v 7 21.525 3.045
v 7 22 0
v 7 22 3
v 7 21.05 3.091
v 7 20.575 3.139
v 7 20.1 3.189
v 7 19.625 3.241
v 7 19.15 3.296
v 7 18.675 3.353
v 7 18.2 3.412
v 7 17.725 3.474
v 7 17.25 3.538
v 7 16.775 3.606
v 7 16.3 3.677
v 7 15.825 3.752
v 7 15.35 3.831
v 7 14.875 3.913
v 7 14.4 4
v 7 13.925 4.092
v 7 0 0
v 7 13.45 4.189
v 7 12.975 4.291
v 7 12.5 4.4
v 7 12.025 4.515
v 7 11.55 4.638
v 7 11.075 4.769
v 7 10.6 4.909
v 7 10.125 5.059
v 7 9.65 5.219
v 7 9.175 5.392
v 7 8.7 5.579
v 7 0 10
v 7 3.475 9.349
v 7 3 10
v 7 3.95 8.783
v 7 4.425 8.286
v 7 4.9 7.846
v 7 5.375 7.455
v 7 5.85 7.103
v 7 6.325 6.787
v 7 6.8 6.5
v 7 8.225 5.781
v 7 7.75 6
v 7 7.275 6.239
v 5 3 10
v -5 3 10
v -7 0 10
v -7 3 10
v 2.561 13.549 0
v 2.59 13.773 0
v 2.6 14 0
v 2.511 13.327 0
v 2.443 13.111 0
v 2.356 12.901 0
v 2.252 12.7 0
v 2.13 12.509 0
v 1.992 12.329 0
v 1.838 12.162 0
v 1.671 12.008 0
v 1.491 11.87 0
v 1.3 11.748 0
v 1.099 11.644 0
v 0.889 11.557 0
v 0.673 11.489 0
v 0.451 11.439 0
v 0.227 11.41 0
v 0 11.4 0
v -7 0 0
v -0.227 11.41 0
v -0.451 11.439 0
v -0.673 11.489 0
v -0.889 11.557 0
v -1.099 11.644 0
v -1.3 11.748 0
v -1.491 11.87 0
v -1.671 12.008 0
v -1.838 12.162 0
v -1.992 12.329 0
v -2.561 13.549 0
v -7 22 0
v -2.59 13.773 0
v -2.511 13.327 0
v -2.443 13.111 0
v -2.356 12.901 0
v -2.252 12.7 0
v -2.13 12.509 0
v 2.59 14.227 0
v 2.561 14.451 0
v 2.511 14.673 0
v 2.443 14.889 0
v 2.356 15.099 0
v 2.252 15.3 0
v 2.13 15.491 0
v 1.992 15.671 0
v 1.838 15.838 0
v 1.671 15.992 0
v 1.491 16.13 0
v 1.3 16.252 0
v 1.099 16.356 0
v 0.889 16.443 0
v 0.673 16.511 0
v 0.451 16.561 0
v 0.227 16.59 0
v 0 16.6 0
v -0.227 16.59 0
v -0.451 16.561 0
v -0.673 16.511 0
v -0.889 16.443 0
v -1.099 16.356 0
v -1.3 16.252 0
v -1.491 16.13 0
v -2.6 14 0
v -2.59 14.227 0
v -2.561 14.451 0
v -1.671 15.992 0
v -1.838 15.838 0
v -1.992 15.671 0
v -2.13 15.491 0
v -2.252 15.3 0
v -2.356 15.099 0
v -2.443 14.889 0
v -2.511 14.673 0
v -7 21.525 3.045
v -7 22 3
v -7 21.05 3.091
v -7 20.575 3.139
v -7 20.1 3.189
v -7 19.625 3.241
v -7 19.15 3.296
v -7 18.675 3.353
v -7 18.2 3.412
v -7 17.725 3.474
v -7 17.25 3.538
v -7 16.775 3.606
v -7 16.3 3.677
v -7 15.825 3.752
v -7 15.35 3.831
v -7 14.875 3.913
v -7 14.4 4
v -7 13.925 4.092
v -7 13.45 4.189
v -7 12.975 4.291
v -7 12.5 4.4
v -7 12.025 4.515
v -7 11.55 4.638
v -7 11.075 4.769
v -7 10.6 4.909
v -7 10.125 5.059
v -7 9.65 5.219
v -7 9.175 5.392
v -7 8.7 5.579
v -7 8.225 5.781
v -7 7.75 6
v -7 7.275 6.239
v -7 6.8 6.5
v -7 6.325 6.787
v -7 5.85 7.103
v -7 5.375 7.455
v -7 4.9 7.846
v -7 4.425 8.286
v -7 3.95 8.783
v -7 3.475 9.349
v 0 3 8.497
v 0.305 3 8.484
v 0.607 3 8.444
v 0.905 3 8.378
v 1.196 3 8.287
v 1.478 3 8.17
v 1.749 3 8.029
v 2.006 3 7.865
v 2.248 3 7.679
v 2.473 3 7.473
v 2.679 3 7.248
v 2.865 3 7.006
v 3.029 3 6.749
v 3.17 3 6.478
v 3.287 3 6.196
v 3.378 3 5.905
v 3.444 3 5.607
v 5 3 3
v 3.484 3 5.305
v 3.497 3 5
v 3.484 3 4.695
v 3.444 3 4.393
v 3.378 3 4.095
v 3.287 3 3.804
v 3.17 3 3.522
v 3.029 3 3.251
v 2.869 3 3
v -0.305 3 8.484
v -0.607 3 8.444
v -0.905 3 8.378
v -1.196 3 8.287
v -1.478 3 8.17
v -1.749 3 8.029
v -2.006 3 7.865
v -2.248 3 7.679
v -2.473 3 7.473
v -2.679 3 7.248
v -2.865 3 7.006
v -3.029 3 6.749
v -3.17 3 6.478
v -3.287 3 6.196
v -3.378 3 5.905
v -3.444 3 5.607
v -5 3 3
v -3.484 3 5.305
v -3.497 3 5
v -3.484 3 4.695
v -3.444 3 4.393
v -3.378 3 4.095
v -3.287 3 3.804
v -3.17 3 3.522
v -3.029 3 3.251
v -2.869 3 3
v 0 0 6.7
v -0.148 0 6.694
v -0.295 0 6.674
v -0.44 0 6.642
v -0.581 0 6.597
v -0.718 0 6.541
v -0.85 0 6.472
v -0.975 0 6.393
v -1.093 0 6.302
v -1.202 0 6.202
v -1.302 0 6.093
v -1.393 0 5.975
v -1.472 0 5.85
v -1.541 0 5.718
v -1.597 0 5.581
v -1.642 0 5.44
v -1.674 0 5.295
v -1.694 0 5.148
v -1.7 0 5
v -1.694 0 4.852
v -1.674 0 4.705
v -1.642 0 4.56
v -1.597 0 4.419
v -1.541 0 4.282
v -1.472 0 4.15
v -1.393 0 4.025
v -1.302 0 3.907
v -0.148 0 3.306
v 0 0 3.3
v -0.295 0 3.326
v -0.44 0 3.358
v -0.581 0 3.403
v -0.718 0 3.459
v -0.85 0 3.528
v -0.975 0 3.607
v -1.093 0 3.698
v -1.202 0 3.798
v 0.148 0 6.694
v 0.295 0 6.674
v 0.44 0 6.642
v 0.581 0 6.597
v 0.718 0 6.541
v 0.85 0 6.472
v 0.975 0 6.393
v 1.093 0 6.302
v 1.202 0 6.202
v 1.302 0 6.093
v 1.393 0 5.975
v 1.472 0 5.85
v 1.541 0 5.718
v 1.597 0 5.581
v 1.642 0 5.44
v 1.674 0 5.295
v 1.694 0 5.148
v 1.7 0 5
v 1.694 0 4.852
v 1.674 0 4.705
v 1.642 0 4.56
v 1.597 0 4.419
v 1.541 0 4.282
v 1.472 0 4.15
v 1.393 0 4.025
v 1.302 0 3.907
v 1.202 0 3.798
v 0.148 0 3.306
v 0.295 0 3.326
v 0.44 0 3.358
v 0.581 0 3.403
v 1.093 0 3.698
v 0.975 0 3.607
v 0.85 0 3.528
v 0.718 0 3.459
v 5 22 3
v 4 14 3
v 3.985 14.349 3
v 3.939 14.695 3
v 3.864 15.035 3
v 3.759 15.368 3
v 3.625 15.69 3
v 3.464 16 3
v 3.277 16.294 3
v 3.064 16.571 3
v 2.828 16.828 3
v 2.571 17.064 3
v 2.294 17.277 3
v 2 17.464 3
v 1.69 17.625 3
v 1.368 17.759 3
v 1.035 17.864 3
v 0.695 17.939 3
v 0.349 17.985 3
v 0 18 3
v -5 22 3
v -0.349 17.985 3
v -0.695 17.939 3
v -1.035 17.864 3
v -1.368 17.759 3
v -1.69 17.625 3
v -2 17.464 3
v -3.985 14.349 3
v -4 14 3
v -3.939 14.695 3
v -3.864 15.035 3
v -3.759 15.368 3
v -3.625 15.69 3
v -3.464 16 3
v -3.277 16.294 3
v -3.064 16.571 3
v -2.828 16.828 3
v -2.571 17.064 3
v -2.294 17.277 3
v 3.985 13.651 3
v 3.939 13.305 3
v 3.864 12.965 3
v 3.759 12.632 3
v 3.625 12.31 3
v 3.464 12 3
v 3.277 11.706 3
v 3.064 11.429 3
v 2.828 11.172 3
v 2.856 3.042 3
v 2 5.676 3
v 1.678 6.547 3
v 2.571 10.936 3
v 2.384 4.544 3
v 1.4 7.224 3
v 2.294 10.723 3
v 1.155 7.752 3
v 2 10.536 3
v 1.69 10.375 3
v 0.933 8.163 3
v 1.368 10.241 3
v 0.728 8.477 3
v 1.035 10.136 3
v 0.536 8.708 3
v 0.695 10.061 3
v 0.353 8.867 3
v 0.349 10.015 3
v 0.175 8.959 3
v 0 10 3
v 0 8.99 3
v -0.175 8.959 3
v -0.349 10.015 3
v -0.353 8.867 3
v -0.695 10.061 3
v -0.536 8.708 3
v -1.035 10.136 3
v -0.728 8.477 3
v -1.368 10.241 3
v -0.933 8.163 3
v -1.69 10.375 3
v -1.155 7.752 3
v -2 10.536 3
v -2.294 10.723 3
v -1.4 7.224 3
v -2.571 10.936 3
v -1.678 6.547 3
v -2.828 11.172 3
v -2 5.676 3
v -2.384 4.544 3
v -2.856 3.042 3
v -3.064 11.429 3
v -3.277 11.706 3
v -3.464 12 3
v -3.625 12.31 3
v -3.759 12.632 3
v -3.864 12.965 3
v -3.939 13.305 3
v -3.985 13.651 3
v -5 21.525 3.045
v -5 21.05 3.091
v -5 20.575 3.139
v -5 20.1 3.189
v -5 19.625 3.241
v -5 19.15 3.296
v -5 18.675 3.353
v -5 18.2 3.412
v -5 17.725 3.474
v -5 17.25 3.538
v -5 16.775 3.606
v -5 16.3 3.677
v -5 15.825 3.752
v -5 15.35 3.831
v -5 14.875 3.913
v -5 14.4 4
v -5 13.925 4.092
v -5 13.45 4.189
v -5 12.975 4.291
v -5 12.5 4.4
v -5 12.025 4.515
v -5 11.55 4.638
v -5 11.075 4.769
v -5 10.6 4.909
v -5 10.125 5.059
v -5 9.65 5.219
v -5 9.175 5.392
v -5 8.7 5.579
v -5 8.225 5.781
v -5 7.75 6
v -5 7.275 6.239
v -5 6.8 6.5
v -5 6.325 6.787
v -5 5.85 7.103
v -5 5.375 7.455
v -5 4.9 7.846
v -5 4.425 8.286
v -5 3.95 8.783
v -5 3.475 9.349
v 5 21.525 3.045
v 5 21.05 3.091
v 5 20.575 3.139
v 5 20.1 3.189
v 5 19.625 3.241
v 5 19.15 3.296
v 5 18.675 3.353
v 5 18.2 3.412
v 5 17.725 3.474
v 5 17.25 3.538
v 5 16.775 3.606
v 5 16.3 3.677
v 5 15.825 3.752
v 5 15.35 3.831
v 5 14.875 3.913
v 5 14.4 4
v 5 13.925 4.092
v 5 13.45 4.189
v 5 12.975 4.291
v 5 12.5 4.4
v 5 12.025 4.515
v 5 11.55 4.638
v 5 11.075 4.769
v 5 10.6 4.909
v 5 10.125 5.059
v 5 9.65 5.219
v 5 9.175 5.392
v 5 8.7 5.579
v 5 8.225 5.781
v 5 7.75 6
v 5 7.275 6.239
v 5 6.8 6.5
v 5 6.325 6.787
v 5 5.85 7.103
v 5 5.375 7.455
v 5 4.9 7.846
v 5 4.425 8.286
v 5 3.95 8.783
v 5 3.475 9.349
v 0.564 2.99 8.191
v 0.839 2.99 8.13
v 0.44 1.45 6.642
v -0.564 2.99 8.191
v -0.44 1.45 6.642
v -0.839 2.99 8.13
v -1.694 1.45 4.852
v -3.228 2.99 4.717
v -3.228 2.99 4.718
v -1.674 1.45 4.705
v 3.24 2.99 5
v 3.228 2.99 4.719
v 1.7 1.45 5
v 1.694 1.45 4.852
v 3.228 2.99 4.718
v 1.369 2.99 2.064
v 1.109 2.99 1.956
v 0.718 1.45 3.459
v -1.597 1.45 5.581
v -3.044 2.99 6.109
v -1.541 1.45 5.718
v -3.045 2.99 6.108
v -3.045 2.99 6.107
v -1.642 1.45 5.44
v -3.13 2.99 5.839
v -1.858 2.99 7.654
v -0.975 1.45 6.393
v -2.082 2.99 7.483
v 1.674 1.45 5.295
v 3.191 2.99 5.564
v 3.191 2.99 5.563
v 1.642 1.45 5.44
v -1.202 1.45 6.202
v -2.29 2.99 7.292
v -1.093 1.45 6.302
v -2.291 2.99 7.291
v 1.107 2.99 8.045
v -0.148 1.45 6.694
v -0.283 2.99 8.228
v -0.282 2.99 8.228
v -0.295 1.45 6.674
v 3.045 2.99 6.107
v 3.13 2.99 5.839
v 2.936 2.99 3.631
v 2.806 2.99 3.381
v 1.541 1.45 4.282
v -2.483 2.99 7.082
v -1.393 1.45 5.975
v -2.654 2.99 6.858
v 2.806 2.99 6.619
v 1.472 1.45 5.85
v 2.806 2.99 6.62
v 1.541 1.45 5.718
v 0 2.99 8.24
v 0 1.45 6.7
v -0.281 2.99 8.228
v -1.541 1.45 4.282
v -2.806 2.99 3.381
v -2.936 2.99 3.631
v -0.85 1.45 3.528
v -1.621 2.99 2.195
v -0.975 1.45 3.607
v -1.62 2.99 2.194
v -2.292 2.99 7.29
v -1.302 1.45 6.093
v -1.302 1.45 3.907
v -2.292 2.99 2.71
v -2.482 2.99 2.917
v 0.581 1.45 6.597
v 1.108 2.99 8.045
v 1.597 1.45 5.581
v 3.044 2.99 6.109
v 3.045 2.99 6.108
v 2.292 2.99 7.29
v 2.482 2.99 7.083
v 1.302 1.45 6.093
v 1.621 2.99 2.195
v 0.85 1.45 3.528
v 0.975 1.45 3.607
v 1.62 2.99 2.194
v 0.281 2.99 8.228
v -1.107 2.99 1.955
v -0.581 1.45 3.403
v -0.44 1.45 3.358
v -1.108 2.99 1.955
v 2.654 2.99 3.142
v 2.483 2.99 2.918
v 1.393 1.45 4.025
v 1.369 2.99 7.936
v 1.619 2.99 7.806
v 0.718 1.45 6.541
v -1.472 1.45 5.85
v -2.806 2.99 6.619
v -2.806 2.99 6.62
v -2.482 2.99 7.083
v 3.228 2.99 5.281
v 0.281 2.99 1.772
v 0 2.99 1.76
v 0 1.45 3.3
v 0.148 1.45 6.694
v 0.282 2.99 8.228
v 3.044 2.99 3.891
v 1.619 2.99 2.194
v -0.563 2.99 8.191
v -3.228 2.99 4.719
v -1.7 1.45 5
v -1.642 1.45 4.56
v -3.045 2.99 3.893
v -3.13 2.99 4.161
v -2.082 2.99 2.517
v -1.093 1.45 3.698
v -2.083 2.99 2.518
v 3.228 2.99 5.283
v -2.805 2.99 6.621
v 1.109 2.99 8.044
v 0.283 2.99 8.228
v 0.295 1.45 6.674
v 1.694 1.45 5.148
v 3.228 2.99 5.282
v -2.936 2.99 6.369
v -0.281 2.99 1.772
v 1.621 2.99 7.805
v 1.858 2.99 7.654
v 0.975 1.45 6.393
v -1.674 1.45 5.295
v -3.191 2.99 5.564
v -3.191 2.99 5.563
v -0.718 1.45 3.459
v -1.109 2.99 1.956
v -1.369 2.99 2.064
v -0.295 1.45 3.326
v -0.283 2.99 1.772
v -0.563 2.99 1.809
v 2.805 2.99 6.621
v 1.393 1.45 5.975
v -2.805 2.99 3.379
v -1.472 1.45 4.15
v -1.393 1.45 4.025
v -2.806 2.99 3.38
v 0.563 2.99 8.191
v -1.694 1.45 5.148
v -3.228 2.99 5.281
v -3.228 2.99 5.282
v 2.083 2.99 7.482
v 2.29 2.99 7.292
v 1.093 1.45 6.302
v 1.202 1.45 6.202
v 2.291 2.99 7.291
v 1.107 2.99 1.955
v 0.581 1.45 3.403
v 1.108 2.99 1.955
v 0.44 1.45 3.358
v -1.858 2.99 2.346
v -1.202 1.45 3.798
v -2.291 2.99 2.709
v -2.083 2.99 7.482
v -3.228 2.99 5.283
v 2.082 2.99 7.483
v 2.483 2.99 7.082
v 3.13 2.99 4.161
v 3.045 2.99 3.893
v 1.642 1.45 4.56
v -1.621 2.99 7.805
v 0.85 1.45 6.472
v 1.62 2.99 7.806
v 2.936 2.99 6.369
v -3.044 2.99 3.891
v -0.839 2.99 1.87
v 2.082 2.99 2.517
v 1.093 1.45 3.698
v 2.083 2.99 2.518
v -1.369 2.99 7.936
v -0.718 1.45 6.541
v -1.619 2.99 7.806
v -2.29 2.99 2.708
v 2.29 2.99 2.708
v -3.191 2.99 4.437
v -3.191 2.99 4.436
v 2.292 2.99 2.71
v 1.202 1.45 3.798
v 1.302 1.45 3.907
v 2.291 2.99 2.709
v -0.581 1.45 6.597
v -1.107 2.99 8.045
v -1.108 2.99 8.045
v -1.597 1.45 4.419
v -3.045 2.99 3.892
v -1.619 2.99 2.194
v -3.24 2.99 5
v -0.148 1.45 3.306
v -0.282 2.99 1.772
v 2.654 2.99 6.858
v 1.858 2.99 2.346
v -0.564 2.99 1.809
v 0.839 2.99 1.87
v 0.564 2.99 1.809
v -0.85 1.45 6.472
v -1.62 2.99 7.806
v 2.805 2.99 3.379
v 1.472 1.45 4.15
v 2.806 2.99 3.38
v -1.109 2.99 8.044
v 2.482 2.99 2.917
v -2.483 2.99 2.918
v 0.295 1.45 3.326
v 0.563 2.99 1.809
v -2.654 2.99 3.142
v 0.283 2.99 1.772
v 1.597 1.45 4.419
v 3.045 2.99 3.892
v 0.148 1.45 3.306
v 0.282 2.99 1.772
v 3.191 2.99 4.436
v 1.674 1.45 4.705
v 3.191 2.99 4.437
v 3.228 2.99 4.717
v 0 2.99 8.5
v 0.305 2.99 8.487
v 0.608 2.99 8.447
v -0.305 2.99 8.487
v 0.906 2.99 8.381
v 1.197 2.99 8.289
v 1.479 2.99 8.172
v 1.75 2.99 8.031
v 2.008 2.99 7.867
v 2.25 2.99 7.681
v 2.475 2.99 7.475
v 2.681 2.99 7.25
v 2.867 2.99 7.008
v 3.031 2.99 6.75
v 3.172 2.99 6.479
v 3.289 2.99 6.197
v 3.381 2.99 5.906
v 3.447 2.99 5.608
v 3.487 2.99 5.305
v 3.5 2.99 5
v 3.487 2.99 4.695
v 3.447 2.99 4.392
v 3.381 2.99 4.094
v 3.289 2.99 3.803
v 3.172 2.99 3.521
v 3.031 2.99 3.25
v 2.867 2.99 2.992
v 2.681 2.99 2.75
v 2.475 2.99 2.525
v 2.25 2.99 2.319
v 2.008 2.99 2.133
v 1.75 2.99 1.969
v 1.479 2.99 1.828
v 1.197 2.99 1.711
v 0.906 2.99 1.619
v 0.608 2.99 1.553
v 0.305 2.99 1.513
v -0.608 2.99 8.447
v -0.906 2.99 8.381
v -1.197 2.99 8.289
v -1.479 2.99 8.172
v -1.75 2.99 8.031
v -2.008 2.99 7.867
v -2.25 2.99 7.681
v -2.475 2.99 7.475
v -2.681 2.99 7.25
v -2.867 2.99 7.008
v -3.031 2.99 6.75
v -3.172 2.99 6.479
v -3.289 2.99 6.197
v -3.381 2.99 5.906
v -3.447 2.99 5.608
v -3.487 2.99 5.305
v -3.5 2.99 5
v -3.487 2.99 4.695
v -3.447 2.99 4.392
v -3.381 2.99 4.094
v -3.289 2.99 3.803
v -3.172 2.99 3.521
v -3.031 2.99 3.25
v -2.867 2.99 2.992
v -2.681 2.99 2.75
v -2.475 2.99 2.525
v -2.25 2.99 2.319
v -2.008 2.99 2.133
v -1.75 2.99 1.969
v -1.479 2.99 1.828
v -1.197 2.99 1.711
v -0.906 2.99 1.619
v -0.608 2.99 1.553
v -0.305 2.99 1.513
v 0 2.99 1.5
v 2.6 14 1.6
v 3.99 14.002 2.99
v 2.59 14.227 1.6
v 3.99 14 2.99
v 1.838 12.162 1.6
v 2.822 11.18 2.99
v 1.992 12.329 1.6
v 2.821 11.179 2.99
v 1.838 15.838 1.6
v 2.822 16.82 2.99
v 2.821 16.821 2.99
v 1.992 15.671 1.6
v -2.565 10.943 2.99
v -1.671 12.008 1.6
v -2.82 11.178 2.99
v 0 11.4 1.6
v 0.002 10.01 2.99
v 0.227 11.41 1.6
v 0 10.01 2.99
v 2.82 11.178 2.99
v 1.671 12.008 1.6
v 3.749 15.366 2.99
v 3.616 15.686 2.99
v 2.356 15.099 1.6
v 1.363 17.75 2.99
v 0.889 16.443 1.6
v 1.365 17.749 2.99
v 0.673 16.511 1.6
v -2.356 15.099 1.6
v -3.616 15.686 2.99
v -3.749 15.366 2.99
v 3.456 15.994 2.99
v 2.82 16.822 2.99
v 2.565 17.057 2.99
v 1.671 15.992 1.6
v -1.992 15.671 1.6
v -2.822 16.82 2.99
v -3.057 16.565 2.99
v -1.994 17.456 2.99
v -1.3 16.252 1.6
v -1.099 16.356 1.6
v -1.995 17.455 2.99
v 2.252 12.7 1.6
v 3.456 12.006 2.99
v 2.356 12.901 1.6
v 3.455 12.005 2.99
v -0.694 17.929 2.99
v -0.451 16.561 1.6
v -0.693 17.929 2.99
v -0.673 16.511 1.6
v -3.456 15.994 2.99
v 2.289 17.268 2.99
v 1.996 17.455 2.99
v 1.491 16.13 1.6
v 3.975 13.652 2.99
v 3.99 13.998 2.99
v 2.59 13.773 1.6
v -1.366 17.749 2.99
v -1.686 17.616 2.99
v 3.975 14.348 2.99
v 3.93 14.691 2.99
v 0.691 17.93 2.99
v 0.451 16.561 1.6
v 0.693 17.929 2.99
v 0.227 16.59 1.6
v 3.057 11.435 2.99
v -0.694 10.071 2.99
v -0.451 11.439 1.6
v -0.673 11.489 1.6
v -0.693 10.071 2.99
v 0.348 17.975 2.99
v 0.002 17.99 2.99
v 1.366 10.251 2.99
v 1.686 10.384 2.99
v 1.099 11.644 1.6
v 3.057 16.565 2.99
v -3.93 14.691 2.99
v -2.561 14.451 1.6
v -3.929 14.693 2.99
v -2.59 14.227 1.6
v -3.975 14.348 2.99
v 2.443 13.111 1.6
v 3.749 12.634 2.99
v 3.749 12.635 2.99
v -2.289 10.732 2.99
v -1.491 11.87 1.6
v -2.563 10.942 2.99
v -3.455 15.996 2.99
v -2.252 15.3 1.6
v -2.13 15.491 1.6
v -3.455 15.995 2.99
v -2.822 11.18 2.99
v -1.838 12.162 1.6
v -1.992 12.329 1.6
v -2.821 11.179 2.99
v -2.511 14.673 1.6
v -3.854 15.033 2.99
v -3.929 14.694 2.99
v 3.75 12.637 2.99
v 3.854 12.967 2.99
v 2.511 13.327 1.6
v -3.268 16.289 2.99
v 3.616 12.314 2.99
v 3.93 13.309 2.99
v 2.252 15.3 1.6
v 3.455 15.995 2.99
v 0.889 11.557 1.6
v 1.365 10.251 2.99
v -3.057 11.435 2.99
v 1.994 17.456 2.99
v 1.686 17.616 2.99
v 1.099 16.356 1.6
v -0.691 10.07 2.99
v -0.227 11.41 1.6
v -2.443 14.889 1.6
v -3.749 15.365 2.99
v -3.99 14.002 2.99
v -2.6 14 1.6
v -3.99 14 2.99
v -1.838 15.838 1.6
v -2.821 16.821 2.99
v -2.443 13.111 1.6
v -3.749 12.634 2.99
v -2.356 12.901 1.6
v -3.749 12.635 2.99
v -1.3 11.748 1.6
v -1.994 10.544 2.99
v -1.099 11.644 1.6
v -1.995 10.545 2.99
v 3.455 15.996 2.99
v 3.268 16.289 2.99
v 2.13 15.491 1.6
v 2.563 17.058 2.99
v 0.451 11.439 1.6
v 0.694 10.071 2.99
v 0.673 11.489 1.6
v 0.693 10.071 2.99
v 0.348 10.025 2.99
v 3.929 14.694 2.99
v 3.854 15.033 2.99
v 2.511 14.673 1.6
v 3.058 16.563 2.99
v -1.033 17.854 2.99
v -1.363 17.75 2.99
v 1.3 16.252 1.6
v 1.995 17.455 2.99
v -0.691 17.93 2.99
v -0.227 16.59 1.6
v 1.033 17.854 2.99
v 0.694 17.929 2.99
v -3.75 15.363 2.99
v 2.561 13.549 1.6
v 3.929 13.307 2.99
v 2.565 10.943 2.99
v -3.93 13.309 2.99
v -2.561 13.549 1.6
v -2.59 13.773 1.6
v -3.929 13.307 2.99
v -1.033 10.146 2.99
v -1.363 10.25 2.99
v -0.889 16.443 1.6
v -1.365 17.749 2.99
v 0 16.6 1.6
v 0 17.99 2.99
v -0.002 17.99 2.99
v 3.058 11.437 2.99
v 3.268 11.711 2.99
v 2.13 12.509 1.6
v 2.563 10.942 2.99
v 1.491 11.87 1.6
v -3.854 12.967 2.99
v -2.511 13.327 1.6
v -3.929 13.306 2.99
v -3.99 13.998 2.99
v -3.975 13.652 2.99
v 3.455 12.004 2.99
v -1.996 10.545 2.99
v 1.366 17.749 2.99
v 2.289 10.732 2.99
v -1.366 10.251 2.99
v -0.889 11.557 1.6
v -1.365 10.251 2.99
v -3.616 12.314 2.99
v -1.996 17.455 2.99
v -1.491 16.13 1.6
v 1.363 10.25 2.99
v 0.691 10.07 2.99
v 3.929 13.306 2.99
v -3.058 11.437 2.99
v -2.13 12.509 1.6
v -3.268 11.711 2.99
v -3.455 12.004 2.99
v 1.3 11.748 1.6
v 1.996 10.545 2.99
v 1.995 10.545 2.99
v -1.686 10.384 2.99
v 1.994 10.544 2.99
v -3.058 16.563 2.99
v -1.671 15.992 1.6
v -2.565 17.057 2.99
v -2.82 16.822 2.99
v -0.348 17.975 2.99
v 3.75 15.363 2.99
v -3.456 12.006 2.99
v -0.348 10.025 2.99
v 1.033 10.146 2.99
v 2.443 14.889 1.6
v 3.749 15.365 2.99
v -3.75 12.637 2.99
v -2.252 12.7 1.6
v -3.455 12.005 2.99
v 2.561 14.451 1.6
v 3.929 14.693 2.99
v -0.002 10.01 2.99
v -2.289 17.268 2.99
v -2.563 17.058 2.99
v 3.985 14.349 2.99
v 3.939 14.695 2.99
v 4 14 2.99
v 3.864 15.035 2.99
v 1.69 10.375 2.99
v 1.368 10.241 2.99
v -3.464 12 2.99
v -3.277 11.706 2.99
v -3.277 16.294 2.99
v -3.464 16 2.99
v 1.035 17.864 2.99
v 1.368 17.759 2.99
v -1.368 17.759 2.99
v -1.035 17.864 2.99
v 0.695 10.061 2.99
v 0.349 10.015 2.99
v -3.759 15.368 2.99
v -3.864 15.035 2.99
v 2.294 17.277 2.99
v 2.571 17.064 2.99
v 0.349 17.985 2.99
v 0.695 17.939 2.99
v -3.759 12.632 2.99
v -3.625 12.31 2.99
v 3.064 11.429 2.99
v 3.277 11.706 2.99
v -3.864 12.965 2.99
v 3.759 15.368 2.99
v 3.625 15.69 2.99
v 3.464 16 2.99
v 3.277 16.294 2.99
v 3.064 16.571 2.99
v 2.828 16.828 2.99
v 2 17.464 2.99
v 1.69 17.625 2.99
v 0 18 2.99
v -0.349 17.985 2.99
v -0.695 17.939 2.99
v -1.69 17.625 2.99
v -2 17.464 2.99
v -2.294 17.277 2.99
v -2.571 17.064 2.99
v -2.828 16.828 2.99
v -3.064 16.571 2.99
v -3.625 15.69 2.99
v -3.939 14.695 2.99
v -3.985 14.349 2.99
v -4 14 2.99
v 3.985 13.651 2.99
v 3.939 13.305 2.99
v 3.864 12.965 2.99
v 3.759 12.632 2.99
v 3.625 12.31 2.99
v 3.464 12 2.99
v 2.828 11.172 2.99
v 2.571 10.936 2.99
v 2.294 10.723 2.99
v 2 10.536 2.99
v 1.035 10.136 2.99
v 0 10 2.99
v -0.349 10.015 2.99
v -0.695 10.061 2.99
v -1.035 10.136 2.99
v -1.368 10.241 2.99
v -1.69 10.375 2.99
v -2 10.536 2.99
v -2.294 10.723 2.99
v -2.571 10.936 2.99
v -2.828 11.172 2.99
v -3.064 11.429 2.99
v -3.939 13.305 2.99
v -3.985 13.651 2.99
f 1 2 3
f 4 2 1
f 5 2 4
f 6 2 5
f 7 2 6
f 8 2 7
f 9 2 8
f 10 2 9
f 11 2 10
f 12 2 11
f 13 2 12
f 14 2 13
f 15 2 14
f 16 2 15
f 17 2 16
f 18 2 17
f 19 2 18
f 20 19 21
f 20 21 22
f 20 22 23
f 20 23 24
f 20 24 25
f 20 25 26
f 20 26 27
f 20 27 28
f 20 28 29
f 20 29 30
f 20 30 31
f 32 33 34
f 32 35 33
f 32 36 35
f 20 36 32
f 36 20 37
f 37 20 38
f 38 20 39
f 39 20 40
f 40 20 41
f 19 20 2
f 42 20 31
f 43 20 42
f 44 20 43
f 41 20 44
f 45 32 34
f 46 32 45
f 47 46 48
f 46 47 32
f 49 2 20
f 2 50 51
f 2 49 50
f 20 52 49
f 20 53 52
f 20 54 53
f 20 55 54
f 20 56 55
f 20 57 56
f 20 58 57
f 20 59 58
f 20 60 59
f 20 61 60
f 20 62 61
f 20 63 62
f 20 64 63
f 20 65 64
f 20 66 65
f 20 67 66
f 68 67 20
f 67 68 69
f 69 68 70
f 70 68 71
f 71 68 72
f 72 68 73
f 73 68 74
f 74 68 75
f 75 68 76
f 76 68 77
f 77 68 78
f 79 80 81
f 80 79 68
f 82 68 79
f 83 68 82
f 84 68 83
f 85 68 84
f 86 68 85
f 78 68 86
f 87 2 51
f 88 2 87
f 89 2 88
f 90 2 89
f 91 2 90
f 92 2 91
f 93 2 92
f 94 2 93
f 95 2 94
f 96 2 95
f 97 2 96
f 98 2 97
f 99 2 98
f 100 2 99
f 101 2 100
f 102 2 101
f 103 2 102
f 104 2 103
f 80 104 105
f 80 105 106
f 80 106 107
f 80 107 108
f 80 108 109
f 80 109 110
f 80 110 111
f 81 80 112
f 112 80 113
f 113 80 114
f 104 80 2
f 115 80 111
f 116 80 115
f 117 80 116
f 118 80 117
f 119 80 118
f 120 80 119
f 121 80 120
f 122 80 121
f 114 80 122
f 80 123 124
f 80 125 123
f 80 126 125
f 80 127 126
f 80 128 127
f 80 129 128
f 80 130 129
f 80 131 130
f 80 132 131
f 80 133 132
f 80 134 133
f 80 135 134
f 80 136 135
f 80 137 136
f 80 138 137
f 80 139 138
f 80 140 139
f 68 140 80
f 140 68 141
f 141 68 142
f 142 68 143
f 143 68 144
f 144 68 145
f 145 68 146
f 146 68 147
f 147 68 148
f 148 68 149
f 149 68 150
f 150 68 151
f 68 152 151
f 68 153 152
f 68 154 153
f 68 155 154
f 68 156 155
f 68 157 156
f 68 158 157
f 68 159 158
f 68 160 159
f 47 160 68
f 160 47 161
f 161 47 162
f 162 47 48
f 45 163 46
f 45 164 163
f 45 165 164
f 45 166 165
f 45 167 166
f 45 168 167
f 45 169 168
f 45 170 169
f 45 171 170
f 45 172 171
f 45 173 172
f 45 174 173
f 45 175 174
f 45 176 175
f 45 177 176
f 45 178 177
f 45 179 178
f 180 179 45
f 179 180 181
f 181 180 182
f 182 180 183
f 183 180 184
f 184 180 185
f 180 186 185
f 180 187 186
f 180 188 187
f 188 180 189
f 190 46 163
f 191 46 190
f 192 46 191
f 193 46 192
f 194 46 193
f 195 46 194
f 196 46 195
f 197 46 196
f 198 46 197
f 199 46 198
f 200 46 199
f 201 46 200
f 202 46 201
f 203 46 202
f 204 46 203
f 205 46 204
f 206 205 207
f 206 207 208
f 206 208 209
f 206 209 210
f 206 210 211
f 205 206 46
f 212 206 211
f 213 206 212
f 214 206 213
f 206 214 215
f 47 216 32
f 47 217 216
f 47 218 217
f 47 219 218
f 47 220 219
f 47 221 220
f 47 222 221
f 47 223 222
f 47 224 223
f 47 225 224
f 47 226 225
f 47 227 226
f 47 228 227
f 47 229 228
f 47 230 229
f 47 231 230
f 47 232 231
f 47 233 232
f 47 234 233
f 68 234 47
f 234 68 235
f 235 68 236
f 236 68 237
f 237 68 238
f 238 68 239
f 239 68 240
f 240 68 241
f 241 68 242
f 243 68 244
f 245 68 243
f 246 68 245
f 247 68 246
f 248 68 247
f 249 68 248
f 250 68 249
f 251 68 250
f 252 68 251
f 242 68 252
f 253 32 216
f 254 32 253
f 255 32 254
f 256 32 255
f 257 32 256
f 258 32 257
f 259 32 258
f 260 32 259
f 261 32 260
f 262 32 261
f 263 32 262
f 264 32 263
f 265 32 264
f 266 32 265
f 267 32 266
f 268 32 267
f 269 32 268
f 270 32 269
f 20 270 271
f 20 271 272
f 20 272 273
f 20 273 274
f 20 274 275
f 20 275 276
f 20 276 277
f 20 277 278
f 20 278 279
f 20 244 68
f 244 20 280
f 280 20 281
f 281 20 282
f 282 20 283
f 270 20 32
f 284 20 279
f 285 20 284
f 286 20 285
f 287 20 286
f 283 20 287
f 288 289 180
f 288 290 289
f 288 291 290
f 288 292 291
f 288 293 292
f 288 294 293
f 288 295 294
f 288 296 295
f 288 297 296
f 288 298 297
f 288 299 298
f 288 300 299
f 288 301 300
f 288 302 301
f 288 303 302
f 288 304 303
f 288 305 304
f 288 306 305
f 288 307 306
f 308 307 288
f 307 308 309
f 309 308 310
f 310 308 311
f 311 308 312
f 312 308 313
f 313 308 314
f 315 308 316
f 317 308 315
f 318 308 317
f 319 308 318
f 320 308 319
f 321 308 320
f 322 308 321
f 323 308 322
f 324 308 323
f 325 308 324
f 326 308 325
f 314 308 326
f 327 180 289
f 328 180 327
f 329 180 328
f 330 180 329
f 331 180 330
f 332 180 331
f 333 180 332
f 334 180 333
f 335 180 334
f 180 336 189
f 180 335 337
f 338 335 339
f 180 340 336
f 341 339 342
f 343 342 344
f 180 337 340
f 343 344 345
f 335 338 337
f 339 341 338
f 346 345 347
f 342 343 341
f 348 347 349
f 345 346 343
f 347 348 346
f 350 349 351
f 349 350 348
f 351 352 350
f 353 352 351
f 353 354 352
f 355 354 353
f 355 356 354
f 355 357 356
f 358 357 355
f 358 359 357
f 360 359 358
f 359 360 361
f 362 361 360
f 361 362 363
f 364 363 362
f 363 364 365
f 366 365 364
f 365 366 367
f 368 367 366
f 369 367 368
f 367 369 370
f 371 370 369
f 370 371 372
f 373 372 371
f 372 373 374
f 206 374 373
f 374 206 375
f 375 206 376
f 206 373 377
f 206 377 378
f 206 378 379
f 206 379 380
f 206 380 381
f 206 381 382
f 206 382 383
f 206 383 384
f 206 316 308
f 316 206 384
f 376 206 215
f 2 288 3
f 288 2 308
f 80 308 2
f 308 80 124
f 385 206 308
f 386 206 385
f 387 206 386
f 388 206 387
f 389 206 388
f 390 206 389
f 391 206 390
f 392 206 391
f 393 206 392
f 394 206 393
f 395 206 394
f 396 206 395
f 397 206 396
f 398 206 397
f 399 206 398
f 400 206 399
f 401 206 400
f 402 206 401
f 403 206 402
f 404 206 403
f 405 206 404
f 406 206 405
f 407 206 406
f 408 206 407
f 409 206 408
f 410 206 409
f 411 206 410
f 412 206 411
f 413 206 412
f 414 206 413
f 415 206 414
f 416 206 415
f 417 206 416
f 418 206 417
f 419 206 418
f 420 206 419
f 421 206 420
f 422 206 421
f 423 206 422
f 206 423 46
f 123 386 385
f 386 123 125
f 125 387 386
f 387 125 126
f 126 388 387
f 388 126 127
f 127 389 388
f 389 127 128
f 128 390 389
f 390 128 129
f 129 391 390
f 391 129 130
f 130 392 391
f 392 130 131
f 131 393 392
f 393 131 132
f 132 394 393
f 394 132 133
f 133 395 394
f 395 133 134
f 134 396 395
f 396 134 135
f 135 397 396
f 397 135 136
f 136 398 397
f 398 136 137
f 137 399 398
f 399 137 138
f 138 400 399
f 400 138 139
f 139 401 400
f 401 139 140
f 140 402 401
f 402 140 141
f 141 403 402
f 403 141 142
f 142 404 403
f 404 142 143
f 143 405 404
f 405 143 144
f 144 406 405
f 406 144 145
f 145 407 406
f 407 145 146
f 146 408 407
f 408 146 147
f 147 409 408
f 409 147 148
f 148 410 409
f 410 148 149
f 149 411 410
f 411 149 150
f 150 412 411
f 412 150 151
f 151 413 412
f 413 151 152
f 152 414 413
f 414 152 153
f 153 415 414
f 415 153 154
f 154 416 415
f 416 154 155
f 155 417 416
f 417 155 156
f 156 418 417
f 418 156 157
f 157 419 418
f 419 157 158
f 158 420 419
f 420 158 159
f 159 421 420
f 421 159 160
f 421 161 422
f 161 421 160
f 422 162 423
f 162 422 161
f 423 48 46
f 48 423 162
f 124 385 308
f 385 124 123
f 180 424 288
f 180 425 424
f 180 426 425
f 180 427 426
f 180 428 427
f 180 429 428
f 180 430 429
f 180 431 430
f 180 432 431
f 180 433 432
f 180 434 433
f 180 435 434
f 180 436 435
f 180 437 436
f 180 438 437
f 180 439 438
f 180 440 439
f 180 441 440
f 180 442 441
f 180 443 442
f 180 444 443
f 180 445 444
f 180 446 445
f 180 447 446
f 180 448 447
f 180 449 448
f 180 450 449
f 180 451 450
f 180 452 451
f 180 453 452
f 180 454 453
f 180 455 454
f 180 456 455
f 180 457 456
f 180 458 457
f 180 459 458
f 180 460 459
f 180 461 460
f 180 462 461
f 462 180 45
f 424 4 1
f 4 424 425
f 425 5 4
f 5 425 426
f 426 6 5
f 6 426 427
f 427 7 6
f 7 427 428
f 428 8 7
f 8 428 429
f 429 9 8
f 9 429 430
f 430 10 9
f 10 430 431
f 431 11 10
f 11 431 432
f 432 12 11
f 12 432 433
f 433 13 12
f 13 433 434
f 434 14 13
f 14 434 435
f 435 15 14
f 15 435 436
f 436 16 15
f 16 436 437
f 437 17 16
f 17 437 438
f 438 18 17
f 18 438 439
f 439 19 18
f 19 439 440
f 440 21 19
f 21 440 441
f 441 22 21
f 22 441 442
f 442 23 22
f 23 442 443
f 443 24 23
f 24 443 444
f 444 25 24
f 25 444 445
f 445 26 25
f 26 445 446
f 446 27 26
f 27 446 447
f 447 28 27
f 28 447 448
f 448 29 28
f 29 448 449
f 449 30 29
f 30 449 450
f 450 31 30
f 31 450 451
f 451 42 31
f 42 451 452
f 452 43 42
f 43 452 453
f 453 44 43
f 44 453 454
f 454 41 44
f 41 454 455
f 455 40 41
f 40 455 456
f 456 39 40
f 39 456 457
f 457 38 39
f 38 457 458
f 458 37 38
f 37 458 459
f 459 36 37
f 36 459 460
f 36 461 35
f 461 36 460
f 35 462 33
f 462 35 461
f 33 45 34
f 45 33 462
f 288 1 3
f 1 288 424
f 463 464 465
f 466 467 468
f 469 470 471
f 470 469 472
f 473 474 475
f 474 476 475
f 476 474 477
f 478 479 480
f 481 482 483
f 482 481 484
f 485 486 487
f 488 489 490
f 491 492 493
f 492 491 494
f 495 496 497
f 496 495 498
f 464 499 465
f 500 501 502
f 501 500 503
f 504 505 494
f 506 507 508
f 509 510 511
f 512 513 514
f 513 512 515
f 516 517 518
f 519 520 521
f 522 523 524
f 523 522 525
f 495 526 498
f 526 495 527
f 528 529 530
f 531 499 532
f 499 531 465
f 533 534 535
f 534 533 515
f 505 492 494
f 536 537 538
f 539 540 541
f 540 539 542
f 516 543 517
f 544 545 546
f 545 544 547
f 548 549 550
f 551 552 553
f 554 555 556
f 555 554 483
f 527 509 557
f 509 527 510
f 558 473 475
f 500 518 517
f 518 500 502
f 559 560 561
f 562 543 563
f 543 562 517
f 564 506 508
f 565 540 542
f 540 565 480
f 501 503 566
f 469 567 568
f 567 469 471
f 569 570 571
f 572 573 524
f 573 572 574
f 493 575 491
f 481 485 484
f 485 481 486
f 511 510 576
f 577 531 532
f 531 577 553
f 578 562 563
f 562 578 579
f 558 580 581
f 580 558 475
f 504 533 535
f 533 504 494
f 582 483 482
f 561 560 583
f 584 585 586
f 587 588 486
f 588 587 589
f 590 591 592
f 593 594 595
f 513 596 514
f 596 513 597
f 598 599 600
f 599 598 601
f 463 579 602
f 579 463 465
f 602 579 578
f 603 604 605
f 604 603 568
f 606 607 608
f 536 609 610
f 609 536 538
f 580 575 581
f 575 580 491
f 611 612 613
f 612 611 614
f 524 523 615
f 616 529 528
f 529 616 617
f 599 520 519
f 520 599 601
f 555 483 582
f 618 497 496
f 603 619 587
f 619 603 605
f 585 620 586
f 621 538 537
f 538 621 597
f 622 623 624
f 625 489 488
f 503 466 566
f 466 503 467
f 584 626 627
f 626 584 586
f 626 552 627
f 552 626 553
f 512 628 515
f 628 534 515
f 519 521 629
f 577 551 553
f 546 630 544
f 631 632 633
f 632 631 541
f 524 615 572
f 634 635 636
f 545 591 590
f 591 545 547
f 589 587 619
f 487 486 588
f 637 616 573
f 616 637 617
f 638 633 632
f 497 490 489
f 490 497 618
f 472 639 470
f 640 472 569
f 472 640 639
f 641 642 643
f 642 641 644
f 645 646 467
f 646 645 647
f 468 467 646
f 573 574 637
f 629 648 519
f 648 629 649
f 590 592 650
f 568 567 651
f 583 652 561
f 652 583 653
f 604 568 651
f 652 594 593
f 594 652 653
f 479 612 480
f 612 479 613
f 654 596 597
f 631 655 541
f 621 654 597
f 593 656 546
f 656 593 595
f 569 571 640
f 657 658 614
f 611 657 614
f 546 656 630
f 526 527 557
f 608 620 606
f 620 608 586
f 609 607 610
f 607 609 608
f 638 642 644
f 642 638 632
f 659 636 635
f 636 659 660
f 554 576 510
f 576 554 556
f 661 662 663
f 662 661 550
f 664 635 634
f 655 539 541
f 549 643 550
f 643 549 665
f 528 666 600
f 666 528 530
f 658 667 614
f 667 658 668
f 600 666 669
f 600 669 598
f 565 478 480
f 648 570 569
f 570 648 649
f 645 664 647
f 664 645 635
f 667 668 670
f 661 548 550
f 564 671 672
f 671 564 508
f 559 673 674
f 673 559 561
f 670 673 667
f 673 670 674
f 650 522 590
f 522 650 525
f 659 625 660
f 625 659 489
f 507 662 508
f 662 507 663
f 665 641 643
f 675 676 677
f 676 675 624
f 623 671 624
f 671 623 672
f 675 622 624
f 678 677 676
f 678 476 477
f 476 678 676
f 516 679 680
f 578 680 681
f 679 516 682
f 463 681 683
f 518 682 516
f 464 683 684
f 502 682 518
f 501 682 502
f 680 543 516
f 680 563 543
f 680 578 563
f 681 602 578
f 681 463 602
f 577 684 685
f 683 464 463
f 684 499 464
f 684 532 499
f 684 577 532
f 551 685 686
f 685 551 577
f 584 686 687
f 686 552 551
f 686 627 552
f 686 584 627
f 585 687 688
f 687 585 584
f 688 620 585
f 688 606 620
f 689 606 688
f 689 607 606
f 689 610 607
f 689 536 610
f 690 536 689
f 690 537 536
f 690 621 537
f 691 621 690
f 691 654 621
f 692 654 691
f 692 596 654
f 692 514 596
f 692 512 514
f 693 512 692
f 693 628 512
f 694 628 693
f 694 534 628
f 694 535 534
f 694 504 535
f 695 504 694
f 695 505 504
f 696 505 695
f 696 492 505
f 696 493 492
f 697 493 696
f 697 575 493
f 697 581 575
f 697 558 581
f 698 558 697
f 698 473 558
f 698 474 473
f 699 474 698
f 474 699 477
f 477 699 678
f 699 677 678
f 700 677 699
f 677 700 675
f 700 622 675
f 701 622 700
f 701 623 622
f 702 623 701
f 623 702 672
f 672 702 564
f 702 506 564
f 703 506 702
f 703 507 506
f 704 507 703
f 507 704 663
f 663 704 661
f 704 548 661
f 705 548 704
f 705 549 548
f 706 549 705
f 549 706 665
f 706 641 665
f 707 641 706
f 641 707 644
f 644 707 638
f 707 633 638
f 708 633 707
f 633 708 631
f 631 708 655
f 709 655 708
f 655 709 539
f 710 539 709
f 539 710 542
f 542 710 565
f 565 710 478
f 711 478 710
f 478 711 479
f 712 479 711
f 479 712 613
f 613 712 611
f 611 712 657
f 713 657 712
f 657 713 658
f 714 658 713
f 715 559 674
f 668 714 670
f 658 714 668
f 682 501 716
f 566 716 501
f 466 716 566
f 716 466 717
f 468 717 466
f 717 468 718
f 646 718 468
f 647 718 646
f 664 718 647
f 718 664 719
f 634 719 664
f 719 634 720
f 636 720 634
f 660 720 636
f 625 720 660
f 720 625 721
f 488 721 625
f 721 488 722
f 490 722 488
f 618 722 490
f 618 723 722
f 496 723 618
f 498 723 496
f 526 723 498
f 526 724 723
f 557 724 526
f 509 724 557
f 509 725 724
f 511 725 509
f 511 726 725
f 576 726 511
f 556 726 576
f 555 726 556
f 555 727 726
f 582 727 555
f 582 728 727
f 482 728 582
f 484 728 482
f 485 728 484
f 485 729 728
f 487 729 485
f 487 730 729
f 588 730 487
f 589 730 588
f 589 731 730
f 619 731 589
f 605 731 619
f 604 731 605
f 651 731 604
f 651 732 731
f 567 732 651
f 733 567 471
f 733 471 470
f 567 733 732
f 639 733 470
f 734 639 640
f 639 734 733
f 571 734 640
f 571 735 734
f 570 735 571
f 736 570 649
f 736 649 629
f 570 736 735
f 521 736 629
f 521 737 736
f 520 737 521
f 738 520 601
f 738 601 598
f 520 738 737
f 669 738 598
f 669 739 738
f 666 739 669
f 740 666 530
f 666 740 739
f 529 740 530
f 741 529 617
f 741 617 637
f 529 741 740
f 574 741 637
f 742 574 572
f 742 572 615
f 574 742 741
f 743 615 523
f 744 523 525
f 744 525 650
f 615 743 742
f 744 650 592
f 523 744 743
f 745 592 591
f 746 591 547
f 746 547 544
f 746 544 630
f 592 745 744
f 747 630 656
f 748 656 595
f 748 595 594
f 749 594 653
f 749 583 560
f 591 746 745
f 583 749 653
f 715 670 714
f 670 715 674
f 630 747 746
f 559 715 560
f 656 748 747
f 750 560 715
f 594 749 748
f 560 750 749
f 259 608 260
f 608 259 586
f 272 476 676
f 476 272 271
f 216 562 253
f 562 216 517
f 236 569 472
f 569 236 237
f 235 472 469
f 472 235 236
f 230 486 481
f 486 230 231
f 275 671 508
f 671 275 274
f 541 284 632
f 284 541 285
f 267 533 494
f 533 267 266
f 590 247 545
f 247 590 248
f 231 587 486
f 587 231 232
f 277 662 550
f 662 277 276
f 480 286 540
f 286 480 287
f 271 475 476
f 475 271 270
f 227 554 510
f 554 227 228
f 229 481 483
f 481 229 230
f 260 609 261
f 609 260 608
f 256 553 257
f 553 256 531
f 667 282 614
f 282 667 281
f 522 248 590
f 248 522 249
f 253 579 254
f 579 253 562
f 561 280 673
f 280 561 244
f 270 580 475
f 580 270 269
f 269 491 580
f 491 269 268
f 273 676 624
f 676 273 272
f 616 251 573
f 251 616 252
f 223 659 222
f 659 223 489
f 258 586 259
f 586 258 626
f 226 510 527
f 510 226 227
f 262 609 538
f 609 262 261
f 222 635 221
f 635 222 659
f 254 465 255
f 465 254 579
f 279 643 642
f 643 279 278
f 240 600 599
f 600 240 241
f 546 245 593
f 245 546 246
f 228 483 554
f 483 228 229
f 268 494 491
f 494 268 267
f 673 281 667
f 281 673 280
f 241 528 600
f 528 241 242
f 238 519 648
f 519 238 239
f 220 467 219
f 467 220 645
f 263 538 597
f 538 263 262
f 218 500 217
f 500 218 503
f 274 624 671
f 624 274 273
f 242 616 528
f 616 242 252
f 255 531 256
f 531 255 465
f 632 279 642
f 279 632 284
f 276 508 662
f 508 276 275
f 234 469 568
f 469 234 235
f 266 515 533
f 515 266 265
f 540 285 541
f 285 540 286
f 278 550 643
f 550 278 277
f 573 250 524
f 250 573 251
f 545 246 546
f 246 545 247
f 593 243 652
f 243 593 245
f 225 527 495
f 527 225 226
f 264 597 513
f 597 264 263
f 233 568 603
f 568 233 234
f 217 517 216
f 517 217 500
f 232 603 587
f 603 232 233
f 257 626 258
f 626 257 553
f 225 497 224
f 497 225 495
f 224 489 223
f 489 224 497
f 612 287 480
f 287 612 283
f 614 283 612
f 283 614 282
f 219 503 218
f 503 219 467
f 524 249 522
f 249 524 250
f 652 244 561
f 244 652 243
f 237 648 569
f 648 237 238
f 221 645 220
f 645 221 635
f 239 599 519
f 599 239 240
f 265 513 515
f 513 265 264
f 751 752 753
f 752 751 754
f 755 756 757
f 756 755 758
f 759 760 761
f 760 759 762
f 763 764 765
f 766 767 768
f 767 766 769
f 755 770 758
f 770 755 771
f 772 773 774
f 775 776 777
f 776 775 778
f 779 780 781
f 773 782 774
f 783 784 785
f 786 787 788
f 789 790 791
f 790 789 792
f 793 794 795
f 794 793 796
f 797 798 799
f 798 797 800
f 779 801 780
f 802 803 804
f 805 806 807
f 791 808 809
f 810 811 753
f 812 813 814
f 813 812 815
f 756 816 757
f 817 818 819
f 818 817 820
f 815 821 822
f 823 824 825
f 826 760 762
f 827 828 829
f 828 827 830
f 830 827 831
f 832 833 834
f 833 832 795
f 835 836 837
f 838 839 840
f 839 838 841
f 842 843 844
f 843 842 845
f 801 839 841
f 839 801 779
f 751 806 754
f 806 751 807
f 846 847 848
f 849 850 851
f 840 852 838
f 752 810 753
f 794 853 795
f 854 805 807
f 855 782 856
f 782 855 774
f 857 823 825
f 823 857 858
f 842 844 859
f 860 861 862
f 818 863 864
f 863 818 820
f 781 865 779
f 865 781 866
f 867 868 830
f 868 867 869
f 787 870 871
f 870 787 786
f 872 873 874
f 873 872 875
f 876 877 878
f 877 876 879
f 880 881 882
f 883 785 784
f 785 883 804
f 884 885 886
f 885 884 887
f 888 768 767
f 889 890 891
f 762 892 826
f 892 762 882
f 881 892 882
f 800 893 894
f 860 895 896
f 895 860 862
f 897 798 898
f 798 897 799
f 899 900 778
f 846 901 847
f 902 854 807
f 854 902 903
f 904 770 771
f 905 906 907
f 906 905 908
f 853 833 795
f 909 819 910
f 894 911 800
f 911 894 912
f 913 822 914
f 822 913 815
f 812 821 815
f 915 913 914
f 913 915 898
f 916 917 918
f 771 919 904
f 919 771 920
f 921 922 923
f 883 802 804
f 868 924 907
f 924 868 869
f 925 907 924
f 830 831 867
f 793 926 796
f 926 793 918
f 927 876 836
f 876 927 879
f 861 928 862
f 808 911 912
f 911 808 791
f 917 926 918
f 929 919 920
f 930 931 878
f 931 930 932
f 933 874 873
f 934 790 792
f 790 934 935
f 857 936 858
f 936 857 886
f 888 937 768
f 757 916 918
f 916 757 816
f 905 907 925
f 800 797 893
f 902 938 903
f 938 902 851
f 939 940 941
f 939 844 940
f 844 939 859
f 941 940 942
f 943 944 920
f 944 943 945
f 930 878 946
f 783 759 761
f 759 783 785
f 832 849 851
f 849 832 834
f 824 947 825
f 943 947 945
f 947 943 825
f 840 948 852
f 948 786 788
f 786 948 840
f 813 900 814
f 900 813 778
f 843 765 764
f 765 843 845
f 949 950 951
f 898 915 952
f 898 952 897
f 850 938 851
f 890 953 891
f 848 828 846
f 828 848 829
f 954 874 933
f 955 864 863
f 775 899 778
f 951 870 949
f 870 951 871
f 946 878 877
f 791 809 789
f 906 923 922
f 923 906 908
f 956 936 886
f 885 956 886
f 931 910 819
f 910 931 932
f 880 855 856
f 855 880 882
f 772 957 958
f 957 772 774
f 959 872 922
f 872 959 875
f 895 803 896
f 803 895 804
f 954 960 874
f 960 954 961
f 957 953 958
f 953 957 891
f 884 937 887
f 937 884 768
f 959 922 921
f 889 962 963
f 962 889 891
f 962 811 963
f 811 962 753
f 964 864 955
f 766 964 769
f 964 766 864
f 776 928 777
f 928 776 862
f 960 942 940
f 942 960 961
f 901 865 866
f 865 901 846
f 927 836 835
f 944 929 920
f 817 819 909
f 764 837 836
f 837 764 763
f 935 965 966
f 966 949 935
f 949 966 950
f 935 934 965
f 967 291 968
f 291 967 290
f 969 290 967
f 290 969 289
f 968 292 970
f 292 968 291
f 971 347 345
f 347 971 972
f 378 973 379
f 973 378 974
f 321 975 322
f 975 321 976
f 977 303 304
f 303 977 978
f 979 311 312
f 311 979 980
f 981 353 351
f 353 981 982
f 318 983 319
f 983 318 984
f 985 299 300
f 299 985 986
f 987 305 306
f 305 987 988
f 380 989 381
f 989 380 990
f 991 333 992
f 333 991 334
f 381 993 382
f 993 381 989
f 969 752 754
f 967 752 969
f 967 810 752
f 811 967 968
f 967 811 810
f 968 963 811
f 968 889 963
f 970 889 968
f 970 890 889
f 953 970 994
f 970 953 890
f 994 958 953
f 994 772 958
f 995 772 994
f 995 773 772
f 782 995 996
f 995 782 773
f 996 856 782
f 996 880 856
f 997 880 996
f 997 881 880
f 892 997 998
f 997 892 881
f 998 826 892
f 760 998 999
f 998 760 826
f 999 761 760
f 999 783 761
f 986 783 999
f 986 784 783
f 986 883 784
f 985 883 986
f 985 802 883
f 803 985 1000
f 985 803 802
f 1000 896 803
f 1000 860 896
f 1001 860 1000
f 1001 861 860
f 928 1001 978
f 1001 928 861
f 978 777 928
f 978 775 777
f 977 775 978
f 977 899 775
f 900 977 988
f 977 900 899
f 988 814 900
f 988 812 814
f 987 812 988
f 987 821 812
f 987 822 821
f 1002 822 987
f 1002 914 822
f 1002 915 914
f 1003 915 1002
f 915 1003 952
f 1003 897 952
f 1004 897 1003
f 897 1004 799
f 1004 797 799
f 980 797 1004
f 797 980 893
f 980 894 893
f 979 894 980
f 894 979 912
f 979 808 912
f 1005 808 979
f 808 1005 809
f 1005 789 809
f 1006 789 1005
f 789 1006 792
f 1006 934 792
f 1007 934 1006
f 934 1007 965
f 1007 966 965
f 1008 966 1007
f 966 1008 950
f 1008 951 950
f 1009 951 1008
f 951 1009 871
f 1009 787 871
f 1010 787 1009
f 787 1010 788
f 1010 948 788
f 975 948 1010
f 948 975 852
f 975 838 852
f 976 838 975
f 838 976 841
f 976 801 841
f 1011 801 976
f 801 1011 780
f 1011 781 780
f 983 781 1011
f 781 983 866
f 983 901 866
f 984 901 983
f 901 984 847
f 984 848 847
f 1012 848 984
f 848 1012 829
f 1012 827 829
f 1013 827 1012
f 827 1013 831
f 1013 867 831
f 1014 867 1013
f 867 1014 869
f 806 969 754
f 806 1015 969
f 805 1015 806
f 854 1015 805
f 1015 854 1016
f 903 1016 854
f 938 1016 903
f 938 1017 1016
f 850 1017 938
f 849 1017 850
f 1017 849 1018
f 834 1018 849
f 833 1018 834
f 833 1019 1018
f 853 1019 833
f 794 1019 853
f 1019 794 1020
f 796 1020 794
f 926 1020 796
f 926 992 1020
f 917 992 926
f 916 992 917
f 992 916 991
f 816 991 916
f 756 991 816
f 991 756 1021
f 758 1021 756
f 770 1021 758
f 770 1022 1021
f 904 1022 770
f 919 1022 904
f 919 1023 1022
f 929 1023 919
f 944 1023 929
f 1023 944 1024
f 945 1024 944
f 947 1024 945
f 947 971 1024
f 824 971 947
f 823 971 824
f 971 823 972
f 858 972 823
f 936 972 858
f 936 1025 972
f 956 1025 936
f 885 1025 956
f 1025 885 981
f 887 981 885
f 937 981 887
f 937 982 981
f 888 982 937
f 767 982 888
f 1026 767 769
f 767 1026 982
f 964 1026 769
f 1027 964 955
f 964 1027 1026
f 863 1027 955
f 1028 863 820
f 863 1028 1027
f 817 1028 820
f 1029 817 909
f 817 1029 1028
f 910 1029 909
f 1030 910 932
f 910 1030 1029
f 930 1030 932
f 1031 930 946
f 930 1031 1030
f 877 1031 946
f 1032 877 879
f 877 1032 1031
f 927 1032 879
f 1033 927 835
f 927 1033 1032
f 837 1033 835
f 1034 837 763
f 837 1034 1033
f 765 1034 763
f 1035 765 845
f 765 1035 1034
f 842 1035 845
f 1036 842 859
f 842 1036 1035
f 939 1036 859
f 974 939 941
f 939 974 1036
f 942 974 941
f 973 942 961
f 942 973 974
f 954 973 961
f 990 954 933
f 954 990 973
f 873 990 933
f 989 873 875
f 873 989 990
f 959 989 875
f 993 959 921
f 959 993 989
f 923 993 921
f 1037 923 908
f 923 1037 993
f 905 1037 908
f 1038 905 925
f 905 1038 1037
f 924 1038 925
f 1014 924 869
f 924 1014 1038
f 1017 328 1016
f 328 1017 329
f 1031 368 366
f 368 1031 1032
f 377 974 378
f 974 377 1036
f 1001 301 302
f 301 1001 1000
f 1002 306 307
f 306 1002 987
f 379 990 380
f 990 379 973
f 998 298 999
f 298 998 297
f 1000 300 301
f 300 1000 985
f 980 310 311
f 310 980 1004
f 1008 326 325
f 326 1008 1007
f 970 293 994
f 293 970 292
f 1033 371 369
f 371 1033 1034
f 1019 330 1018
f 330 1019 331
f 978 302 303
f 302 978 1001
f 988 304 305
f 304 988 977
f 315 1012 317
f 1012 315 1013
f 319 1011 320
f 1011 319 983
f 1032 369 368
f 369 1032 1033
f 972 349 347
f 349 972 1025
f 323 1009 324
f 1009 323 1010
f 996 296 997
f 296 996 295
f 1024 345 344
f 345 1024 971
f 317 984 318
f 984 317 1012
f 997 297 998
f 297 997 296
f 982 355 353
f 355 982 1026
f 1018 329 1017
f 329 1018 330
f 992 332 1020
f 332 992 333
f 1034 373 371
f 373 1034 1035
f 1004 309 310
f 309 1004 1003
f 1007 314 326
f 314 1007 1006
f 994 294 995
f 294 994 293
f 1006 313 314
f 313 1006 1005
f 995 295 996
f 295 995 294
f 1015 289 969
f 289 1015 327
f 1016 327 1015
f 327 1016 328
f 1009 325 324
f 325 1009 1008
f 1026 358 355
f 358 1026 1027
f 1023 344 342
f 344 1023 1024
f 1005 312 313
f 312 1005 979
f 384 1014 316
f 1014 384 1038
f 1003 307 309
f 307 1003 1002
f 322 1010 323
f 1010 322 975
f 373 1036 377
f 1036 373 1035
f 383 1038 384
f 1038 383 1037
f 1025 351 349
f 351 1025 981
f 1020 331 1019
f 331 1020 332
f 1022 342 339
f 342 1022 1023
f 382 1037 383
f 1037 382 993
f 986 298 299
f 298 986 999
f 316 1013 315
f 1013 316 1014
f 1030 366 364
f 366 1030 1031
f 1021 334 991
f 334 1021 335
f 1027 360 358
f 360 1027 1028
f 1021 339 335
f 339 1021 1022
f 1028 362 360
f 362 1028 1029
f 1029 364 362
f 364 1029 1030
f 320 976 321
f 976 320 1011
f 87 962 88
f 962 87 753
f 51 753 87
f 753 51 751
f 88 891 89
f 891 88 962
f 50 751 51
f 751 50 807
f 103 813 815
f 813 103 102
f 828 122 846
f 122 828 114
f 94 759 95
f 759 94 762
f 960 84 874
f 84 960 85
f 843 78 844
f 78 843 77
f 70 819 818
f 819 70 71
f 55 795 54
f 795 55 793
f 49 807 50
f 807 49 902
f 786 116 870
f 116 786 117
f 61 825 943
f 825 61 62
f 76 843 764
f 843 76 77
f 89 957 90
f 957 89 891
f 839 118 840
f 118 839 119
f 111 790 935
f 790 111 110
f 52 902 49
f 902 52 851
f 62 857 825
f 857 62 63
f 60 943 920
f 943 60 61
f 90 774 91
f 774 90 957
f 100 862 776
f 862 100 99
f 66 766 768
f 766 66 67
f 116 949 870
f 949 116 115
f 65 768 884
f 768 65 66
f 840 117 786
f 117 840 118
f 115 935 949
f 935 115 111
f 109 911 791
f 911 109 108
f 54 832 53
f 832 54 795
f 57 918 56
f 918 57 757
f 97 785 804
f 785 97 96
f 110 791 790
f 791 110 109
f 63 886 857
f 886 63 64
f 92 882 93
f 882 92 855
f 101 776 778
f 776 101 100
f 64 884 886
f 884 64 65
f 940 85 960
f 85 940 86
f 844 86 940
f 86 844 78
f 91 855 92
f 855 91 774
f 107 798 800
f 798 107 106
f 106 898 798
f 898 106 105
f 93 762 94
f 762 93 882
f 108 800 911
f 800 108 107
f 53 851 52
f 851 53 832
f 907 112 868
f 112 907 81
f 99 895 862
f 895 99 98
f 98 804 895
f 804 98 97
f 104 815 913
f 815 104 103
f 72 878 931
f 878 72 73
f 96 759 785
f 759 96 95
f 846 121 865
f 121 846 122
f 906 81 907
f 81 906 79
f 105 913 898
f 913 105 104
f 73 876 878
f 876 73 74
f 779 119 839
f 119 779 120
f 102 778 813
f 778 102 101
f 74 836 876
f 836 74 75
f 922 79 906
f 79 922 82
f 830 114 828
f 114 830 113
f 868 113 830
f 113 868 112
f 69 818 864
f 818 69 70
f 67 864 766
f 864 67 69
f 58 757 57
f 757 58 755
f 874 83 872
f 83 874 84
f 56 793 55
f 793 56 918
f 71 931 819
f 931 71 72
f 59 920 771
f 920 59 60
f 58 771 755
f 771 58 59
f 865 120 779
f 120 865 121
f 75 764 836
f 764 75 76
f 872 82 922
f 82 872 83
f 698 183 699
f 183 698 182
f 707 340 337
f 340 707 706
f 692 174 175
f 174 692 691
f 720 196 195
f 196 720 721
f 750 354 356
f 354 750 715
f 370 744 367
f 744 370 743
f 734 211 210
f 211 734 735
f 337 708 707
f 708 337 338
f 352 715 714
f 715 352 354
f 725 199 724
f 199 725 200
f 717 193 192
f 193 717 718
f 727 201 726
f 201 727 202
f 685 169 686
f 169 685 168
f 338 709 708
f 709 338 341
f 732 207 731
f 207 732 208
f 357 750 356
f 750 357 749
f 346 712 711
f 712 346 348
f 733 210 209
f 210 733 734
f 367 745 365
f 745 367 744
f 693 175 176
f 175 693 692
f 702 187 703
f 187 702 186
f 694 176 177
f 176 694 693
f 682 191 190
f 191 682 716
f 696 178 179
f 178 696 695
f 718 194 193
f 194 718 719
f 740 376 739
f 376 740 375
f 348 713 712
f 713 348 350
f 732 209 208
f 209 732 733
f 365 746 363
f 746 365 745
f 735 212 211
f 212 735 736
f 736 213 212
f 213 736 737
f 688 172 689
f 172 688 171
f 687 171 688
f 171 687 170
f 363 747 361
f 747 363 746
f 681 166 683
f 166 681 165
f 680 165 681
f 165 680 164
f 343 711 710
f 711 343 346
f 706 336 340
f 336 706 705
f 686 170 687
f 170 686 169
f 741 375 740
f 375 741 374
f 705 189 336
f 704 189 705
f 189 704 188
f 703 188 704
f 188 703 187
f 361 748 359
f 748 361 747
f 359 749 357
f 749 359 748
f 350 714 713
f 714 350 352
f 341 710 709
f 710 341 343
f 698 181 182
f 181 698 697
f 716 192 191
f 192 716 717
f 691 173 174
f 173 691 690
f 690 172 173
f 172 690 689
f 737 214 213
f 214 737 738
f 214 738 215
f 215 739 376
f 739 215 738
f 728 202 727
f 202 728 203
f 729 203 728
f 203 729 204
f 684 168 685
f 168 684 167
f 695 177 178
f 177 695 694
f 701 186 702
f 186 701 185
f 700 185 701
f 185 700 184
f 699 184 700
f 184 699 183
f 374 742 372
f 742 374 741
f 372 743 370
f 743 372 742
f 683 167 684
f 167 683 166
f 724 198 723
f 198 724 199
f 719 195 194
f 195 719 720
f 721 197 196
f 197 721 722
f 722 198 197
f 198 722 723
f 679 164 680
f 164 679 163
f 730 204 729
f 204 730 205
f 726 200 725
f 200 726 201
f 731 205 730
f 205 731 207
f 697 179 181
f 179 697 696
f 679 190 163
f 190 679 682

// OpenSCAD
// Rail anchor: L-foot that fixes the end of a 10x10 bottom rail of the bench
// stand to the wooden base plate (PNDLM-11 coast-down / acceleration runs).
//
// The rail lies flat on the plate. Its end face has an M3 thread in the centre.
// The vertical plate of the anchor sits against that end face; a countersunk
// M3 goes through it into the rail along the rail axis. A conical relief in the foot top
// gives the head room to slide in. The foot lies on the base plate and takes
// a wood screw. Two hyperbolic side gussets sweep from
// the plate top to the foot tip.
//
// Frame: rail end face at y = 0, rail at y < 0; base plate top at z = 0;
// X across the rail. Prints as modelled: foot flat on the bed, no supports.
// Self-contained on purpose: the bench stand is not the pendulum of params.scad.

// ---- rail ----
rail = 10;              // rail cross-section (square)
rail_hole_z = rail / 2; // M3 thread sits in the centre of the end face

// ---- anchor ----
plate_t = 3;            // vertical plate thickness (Y)
foot_t = 3;             // foot thickness (Z)
foot_len = 22;          // rail face to foot tip (Y)
gusset_t = 2;           // each side gusset (X)
gusset_k = 3;           // gusset curve: 0 = straight chamfer, larger = tighter hyperbola
gusset_n = 40;          // segments along the curve
width = rail + 2 * gusset_t;

// ---- screws ----
m3_hole = 3.4;
m3_cs_d = 6.5;          // DIN 7991 countersunk head (dk 6.0) + slop; flush with the plate
relief_d = 7;           // head relief cone at the plate face (head + 0.5)
relief_len = 14;        // cone length along +Y; sets how gently the scoop rises
ws_hole = 5.2;          // wood screw shank clearance (4 mm screw)
ws_cs_d = 8;            // wood screw head countersink; 0 = none
ws_y = 14;              // wood screw centre from the rail face

$fn = 72;

module csk(d, cs_d, h) {
    // Through hole along +Z from z=0 to z=h with a 90 deg countersink opening at z=h.
    translate([0, 0, -1]) cylinder(d = d, h = h + 2);
    if (cs_d > d) {
        cs_h = (cs_d - d) / 2;
        translate([0, 0, h - cs_h]) cylinder(d1 = d, d2 = cs_d, h = cs_h);
        translate([0, 0, h - 0.01]) cylinder(d = cs_d, h = 1);
    }
}

// Hyperbola through (plate_t, rail) and (foot_len, foot_t):
// z = foot_t + (rail - foot_t) * (1 - s) / (1 + k s), s in [0, 1] along the foot.
function gusset_pt(i) = let(s = i / gusset_n)
    [plate_t + s * (foot_len - plate_t), foot_t + (rail - foot_t) * (1 - s) / (1 + gusset_k * s)];

module gusset(x0) {
    translate([x0, 0, 0]) rotate([90, 0, 90]) linear_extrude(gusset_t)
        polygon(concat([[plate_t, foot_t]], [for (i = [0 : gusset_n]) gusset_pt(i)]));
}

module rail_anchor() {
    difference() {
        union() {
            cube([width, plate_t, rail]);                         // vertical plate
            cube([width, foot_len, foot_t]);                      // foot
            gusset(0);
            gusset(width - gusset_t);
        }
        // M3 along the rail axis, countersunk on the foot side (+Y face of the plate)
        translate([width / 2, 0, rail_hole_z]) rotate([-90, 0, 0]) csk(m3_hole, m3_cs_d, plate_t);
        // head relief: cone from the plate face narrowing toward the foot tip,
        // scoops the foot top so the head can slide in along the rail axis
        translate([width / 2, plate_t - 0.01, rail_hole_z]) rotate([-90, 0, 0])
            cylinder(d1 = relief_d, d2 = 0, h = relief_len);
        // wood screw through the foot, countersunk on top
        translate([width / 2, ws_y, 0]) csk(ws_hole, ws_cs_d, foot_t);
    }
}

translate([-width / 2, 0, 0]) rail_anchor();
